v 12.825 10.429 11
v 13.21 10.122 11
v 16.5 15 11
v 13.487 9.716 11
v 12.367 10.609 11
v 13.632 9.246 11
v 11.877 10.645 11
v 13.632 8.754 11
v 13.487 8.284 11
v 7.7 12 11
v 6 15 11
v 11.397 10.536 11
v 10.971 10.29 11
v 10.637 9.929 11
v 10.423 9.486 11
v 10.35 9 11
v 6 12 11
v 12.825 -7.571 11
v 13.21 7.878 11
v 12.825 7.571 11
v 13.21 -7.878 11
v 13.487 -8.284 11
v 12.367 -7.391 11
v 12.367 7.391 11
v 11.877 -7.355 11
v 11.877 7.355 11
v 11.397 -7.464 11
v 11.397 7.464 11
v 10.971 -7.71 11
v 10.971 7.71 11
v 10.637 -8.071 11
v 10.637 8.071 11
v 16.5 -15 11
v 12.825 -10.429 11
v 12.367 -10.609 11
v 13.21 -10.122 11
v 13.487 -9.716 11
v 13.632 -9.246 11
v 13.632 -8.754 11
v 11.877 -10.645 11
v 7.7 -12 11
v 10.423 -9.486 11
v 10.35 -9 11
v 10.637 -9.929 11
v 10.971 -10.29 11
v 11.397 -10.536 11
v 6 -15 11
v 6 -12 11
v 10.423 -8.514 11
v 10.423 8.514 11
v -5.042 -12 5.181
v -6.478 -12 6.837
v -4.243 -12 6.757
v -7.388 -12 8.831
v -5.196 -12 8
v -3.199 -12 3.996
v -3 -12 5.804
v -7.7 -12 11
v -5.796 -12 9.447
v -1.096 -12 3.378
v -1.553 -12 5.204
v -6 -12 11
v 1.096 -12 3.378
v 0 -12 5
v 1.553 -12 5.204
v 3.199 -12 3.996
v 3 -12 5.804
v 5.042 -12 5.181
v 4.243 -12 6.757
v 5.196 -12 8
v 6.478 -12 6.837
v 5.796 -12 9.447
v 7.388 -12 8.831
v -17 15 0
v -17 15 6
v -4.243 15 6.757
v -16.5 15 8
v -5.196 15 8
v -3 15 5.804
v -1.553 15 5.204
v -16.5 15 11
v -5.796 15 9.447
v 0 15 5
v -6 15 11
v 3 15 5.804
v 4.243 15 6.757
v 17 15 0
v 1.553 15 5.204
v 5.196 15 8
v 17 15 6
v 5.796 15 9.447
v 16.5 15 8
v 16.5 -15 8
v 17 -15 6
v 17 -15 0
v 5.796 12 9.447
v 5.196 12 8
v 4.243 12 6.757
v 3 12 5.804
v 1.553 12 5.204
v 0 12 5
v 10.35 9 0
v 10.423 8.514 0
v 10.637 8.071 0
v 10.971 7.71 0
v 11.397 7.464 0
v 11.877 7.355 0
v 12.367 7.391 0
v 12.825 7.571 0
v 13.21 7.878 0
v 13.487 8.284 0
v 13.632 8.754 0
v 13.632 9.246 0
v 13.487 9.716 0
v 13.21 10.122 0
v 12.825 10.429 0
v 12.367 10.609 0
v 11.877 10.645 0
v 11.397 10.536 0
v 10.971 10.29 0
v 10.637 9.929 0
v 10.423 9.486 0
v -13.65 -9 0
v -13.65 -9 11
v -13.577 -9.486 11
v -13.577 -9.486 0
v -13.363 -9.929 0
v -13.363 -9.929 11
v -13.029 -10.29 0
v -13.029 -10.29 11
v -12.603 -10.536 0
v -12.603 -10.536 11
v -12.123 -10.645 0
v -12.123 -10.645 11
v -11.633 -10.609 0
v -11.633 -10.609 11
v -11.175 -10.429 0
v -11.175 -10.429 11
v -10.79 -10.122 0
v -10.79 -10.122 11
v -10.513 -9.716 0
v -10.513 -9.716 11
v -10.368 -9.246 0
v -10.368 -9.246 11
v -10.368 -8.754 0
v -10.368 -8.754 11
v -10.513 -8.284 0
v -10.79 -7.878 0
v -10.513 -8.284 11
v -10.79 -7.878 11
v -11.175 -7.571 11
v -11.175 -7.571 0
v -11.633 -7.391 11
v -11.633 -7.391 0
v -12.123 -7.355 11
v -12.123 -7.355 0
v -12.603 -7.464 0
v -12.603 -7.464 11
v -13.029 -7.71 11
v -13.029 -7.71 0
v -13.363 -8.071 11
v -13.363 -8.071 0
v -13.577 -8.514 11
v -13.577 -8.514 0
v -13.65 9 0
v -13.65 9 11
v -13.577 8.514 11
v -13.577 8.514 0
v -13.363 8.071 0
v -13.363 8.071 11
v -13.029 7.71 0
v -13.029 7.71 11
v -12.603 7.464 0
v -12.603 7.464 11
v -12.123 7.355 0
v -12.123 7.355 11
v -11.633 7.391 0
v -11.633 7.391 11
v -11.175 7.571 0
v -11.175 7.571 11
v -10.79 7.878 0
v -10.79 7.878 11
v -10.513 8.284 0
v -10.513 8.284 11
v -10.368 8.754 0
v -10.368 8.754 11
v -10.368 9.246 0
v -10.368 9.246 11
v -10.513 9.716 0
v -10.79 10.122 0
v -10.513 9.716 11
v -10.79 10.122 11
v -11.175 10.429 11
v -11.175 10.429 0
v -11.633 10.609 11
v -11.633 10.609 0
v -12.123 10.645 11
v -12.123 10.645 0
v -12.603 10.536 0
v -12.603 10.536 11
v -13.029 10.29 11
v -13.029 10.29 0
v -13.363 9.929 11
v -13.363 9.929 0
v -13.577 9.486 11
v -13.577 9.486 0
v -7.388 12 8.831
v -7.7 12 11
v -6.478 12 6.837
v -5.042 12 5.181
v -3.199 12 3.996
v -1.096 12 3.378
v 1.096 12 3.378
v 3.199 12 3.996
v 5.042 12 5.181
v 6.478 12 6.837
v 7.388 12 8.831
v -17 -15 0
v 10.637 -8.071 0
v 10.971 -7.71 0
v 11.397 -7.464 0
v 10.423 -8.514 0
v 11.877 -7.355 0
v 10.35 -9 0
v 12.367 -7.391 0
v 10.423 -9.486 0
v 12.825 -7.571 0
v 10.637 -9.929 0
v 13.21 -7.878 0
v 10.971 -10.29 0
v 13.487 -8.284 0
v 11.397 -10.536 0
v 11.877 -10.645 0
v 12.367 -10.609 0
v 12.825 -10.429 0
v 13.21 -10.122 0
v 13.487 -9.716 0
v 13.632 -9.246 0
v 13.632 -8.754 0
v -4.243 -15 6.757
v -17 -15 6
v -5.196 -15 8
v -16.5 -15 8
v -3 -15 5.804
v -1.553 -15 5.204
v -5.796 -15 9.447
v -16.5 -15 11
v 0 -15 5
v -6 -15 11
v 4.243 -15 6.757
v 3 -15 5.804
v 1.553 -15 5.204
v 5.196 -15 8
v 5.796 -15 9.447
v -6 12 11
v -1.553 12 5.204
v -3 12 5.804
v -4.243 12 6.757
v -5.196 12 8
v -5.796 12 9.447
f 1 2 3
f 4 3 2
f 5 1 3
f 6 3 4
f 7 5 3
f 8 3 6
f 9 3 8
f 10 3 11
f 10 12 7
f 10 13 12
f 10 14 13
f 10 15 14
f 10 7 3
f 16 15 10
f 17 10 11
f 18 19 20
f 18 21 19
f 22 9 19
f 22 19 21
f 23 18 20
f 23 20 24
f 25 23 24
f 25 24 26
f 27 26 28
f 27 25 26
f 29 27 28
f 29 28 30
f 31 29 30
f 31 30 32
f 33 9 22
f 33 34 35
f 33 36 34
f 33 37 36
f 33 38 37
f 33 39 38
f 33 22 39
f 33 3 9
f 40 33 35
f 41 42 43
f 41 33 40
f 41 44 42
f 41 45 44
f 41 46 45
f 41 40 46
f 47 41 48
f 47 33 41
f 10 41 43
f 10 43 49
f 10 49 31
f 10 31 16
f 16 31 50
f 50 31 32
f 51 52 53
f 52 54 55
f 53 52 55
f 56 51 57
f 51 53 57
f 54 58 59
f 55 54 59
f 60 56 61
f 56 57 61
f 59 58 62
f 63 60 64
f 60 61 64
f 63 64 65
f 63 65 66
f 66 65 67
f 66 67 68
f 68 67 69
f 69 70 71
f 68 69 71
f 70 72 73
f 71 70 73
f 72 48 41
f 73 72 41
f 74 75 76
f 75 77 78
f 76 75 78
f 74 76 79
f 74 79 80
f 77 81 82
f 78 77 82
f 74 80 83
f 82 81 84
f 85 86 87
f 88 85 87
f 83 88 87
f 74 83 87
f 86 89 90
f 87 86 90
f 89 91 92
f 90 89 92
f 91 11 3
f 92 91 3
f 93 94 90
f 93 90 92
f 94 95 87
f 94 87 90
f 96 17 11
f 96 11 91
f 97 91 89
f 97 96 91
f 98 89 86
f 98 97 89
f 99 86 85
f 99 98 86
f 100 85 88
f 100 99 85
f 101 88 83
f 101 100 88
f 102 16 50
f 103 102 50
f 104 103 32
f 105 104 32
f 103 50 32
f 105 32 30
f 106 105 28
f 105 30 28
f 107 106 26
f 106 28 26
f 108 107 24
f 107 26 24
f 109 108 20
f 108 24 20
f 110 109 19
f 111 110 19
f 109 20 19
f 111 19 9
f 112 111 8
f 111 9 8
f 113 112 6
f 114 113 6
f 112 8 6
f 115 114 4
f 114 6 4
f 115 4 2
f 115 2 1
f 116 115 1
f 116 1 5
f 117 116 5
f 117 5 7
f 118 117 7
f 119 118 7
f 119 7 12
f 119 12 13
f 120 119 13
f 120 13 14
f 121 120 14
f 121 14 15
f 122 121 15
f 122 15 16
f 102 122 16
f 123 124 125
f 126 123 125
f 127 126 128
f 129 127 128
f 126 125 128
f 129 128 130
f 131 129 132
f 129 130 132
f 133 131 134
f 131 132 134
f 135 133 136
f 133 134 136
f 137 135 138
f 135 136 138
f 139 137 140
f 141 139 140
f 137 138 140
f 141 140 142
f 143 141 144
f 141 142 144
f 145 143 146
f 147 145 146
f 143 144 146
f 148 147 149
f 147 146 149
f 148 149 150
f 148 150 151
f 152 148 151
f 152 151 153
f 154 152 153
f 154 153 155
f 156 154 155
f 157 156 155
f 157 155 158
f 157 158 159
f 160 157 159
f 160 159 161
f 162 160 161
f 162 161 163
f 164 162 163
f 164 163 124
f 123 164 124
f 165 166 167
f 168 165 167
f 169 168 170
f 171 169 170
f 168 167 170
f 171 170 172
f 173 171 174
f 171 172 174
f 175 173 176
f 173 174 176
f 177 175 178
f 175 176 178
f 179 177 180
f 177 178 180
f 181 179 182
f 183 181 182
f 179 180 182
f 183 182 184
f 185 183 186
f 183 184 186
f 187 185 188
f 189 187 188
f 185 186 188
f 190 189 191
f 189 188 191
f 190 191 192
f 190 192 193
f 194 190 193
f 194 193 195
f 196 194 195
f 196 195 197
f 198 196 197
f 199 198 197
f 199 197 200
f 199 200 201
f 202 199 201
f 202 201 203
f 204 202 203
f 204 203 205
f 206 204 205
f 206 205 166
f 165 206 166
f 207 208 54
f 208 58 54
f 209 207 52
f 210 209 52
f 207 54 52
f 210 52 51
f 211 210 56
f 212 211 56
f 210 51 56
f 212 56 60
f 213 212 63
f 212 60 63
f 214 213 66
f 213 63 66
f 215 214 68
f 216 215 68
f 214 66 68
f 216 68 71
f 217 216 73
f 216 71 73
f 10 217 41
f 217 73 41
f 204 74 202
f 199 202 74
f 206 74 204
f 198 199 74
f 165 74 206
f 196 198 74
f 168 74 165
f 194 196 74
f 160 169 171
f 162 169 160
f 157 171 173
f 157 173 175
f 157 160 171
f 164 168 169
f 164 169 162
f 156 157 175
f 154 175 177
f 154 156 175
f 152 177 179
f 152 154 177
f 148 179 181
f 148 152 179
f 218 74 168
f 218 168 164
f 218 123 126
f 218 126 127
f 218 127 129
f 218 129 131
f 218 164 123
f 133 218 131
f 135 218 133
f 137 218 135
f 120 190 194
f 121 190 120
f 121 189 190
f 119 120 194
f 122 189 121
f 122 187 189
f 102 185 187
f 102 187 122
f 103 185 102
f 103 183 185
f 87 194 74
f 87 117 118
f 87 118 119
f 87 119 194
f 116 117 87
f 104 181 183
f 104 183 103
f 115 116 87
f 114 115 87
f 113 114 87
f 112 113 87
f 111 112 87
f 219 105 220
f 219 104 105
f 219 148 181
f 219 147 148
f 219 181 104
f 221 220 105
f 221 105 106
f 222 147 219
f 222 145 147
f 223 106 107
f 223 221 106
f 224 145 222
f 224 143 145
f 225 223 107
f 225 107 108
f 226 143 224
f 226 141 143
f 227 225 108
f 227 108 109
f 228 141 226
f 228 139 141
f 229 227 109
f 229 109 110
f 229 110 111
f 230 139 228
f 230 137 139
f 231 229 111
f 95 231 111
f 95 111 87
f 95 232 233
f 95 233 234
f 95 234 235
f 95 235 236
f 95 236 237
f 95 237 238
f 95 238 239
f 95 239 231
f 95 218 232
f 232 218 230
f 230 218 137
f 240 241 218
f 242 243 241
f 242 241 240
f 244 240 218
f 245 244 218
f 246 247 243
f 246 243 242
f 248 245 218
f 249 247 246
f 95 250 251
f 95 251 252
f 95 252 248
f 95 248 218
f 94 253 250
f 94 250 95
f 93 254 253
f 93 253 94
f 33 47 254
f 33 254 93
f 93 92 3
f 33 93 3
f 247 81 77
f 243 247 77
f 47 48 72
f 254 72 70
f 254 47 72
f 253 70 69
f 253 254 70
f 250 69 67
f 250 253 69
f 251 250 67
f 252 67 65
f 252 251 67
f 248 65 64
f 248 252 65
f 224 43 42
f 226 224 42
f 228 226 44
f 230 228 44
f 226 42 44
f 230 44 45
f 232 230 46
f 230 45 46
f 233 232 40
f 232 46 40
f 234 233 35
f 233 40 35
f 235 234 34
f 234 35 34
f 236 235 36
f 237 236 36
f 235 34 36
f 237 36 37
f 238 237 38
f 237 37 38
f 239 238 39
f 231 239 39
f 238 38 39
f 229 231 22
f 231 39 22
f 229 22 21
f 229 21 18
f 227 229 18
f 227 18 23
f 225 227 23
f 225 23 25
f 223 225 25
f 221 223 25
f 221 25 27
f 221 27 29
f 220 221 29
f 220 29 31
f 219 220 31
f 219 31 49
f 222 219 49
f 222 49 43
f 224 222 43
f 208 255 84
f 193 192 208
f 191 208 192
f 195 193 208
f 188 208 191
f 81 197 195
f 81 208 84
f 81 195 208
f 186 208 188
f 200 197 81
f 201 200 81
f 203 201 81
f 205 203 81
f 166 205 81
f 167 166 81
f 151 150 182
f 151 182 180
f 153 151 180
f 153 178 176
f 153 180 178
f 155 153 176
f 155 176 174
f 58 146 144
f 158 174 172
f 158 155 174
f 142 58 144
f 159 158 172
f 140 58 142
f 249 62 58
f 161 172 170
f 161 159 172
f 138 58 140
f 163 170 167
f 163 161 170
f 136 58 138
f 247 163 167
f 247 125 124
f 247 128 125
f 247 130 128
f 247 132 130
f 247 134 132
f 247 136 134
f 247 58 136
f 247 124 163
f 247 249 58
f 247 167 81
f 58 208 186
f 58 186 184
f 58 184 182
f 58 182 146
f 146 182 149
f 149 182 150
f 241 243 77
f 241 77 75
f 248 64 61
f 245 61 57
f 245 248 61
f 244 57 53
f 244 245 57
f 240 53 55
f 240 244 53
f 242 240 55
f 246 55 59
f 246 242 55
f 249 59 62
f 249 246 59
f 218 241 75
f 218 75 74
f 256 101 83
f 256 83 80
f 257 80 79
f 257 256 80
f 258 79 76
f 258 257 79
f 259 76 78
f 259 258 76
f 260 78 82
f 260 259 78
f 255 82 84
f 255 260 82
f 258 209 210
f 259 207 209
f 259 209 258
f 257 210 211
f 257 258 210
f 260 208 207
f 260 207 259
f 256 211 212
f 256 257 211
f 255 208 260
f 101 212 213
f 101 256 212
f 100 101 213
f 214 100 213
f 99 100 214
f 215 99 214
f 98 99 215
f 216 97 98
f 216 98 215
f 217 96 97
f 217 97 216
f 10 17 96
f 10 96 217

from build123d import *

# Parameters (mm, degrees)
F1_DEPTH = 15
F3_D     = 3.3
F4_R     = 7.7
F5_DEPTH = 12


with BuildPart() as f1:
    # F0 (on Front) → F1 (new body, symmetric)
    with BuildSketch(Plane.XZ):
        with BuildLine():
            Line((-5.4519269615, 0), (0, 0))
            Line((0, 0), (0, 5))
            ThreePointArc((0, 5), (-4.2426406871, 6.7573593129), (-6, 11))
            Line((-6, 11), (-16.5, 11))
            Line((-16.5, 11), (-16.5, 8))
            Line((-16.5, 8), (-17, 6))
            Line((-17, 6), (-17, 0))
            Line((-17, 0), (-9.5, 0))
            Line((-9.5, 0), (-5.4519269615, 0))
        make_face()
        with BuildLine():
            Line((0, 5), (0, 0))
            Line((0, 0), (5.4519269615, 0))
            Line((5.4519269615, 0), (9.5, 0))
            Line((9.5, 0), (17, 0))
            Line((17, 0), (17, 6))
            Line((17, 6), (16.5, 8))
            Line((16.5, 8), (16.5, 11))
            Line((16.5, 11), (6, 11))
            ThreePointArc((6, 11), (4.2426406871, 6.7573593129), (0, 5))
        make_face()
    extrude(amount=F1_DEPTH, both=True)

    # F3 (through all)
    with Locations(Plane(origin=(0, 0, 0), x_dir=(1, 0, 0), z_dir=(0, 0, -1))):
        with Locations((-12, 9), (-12, -9), (12, -9), (12, 9)):
            Hole(F3_D / 2)

    # F4 (on Front) → F5 (cut, symmetric)
    with BuildSketch(Plane.XZ):
        with Locations((0, 11)):
            Circle(F4_R)
    extrude(amount=F5_DEPTH, both=True, mode=Mode.SUBTRACT)


solid = f1.part
